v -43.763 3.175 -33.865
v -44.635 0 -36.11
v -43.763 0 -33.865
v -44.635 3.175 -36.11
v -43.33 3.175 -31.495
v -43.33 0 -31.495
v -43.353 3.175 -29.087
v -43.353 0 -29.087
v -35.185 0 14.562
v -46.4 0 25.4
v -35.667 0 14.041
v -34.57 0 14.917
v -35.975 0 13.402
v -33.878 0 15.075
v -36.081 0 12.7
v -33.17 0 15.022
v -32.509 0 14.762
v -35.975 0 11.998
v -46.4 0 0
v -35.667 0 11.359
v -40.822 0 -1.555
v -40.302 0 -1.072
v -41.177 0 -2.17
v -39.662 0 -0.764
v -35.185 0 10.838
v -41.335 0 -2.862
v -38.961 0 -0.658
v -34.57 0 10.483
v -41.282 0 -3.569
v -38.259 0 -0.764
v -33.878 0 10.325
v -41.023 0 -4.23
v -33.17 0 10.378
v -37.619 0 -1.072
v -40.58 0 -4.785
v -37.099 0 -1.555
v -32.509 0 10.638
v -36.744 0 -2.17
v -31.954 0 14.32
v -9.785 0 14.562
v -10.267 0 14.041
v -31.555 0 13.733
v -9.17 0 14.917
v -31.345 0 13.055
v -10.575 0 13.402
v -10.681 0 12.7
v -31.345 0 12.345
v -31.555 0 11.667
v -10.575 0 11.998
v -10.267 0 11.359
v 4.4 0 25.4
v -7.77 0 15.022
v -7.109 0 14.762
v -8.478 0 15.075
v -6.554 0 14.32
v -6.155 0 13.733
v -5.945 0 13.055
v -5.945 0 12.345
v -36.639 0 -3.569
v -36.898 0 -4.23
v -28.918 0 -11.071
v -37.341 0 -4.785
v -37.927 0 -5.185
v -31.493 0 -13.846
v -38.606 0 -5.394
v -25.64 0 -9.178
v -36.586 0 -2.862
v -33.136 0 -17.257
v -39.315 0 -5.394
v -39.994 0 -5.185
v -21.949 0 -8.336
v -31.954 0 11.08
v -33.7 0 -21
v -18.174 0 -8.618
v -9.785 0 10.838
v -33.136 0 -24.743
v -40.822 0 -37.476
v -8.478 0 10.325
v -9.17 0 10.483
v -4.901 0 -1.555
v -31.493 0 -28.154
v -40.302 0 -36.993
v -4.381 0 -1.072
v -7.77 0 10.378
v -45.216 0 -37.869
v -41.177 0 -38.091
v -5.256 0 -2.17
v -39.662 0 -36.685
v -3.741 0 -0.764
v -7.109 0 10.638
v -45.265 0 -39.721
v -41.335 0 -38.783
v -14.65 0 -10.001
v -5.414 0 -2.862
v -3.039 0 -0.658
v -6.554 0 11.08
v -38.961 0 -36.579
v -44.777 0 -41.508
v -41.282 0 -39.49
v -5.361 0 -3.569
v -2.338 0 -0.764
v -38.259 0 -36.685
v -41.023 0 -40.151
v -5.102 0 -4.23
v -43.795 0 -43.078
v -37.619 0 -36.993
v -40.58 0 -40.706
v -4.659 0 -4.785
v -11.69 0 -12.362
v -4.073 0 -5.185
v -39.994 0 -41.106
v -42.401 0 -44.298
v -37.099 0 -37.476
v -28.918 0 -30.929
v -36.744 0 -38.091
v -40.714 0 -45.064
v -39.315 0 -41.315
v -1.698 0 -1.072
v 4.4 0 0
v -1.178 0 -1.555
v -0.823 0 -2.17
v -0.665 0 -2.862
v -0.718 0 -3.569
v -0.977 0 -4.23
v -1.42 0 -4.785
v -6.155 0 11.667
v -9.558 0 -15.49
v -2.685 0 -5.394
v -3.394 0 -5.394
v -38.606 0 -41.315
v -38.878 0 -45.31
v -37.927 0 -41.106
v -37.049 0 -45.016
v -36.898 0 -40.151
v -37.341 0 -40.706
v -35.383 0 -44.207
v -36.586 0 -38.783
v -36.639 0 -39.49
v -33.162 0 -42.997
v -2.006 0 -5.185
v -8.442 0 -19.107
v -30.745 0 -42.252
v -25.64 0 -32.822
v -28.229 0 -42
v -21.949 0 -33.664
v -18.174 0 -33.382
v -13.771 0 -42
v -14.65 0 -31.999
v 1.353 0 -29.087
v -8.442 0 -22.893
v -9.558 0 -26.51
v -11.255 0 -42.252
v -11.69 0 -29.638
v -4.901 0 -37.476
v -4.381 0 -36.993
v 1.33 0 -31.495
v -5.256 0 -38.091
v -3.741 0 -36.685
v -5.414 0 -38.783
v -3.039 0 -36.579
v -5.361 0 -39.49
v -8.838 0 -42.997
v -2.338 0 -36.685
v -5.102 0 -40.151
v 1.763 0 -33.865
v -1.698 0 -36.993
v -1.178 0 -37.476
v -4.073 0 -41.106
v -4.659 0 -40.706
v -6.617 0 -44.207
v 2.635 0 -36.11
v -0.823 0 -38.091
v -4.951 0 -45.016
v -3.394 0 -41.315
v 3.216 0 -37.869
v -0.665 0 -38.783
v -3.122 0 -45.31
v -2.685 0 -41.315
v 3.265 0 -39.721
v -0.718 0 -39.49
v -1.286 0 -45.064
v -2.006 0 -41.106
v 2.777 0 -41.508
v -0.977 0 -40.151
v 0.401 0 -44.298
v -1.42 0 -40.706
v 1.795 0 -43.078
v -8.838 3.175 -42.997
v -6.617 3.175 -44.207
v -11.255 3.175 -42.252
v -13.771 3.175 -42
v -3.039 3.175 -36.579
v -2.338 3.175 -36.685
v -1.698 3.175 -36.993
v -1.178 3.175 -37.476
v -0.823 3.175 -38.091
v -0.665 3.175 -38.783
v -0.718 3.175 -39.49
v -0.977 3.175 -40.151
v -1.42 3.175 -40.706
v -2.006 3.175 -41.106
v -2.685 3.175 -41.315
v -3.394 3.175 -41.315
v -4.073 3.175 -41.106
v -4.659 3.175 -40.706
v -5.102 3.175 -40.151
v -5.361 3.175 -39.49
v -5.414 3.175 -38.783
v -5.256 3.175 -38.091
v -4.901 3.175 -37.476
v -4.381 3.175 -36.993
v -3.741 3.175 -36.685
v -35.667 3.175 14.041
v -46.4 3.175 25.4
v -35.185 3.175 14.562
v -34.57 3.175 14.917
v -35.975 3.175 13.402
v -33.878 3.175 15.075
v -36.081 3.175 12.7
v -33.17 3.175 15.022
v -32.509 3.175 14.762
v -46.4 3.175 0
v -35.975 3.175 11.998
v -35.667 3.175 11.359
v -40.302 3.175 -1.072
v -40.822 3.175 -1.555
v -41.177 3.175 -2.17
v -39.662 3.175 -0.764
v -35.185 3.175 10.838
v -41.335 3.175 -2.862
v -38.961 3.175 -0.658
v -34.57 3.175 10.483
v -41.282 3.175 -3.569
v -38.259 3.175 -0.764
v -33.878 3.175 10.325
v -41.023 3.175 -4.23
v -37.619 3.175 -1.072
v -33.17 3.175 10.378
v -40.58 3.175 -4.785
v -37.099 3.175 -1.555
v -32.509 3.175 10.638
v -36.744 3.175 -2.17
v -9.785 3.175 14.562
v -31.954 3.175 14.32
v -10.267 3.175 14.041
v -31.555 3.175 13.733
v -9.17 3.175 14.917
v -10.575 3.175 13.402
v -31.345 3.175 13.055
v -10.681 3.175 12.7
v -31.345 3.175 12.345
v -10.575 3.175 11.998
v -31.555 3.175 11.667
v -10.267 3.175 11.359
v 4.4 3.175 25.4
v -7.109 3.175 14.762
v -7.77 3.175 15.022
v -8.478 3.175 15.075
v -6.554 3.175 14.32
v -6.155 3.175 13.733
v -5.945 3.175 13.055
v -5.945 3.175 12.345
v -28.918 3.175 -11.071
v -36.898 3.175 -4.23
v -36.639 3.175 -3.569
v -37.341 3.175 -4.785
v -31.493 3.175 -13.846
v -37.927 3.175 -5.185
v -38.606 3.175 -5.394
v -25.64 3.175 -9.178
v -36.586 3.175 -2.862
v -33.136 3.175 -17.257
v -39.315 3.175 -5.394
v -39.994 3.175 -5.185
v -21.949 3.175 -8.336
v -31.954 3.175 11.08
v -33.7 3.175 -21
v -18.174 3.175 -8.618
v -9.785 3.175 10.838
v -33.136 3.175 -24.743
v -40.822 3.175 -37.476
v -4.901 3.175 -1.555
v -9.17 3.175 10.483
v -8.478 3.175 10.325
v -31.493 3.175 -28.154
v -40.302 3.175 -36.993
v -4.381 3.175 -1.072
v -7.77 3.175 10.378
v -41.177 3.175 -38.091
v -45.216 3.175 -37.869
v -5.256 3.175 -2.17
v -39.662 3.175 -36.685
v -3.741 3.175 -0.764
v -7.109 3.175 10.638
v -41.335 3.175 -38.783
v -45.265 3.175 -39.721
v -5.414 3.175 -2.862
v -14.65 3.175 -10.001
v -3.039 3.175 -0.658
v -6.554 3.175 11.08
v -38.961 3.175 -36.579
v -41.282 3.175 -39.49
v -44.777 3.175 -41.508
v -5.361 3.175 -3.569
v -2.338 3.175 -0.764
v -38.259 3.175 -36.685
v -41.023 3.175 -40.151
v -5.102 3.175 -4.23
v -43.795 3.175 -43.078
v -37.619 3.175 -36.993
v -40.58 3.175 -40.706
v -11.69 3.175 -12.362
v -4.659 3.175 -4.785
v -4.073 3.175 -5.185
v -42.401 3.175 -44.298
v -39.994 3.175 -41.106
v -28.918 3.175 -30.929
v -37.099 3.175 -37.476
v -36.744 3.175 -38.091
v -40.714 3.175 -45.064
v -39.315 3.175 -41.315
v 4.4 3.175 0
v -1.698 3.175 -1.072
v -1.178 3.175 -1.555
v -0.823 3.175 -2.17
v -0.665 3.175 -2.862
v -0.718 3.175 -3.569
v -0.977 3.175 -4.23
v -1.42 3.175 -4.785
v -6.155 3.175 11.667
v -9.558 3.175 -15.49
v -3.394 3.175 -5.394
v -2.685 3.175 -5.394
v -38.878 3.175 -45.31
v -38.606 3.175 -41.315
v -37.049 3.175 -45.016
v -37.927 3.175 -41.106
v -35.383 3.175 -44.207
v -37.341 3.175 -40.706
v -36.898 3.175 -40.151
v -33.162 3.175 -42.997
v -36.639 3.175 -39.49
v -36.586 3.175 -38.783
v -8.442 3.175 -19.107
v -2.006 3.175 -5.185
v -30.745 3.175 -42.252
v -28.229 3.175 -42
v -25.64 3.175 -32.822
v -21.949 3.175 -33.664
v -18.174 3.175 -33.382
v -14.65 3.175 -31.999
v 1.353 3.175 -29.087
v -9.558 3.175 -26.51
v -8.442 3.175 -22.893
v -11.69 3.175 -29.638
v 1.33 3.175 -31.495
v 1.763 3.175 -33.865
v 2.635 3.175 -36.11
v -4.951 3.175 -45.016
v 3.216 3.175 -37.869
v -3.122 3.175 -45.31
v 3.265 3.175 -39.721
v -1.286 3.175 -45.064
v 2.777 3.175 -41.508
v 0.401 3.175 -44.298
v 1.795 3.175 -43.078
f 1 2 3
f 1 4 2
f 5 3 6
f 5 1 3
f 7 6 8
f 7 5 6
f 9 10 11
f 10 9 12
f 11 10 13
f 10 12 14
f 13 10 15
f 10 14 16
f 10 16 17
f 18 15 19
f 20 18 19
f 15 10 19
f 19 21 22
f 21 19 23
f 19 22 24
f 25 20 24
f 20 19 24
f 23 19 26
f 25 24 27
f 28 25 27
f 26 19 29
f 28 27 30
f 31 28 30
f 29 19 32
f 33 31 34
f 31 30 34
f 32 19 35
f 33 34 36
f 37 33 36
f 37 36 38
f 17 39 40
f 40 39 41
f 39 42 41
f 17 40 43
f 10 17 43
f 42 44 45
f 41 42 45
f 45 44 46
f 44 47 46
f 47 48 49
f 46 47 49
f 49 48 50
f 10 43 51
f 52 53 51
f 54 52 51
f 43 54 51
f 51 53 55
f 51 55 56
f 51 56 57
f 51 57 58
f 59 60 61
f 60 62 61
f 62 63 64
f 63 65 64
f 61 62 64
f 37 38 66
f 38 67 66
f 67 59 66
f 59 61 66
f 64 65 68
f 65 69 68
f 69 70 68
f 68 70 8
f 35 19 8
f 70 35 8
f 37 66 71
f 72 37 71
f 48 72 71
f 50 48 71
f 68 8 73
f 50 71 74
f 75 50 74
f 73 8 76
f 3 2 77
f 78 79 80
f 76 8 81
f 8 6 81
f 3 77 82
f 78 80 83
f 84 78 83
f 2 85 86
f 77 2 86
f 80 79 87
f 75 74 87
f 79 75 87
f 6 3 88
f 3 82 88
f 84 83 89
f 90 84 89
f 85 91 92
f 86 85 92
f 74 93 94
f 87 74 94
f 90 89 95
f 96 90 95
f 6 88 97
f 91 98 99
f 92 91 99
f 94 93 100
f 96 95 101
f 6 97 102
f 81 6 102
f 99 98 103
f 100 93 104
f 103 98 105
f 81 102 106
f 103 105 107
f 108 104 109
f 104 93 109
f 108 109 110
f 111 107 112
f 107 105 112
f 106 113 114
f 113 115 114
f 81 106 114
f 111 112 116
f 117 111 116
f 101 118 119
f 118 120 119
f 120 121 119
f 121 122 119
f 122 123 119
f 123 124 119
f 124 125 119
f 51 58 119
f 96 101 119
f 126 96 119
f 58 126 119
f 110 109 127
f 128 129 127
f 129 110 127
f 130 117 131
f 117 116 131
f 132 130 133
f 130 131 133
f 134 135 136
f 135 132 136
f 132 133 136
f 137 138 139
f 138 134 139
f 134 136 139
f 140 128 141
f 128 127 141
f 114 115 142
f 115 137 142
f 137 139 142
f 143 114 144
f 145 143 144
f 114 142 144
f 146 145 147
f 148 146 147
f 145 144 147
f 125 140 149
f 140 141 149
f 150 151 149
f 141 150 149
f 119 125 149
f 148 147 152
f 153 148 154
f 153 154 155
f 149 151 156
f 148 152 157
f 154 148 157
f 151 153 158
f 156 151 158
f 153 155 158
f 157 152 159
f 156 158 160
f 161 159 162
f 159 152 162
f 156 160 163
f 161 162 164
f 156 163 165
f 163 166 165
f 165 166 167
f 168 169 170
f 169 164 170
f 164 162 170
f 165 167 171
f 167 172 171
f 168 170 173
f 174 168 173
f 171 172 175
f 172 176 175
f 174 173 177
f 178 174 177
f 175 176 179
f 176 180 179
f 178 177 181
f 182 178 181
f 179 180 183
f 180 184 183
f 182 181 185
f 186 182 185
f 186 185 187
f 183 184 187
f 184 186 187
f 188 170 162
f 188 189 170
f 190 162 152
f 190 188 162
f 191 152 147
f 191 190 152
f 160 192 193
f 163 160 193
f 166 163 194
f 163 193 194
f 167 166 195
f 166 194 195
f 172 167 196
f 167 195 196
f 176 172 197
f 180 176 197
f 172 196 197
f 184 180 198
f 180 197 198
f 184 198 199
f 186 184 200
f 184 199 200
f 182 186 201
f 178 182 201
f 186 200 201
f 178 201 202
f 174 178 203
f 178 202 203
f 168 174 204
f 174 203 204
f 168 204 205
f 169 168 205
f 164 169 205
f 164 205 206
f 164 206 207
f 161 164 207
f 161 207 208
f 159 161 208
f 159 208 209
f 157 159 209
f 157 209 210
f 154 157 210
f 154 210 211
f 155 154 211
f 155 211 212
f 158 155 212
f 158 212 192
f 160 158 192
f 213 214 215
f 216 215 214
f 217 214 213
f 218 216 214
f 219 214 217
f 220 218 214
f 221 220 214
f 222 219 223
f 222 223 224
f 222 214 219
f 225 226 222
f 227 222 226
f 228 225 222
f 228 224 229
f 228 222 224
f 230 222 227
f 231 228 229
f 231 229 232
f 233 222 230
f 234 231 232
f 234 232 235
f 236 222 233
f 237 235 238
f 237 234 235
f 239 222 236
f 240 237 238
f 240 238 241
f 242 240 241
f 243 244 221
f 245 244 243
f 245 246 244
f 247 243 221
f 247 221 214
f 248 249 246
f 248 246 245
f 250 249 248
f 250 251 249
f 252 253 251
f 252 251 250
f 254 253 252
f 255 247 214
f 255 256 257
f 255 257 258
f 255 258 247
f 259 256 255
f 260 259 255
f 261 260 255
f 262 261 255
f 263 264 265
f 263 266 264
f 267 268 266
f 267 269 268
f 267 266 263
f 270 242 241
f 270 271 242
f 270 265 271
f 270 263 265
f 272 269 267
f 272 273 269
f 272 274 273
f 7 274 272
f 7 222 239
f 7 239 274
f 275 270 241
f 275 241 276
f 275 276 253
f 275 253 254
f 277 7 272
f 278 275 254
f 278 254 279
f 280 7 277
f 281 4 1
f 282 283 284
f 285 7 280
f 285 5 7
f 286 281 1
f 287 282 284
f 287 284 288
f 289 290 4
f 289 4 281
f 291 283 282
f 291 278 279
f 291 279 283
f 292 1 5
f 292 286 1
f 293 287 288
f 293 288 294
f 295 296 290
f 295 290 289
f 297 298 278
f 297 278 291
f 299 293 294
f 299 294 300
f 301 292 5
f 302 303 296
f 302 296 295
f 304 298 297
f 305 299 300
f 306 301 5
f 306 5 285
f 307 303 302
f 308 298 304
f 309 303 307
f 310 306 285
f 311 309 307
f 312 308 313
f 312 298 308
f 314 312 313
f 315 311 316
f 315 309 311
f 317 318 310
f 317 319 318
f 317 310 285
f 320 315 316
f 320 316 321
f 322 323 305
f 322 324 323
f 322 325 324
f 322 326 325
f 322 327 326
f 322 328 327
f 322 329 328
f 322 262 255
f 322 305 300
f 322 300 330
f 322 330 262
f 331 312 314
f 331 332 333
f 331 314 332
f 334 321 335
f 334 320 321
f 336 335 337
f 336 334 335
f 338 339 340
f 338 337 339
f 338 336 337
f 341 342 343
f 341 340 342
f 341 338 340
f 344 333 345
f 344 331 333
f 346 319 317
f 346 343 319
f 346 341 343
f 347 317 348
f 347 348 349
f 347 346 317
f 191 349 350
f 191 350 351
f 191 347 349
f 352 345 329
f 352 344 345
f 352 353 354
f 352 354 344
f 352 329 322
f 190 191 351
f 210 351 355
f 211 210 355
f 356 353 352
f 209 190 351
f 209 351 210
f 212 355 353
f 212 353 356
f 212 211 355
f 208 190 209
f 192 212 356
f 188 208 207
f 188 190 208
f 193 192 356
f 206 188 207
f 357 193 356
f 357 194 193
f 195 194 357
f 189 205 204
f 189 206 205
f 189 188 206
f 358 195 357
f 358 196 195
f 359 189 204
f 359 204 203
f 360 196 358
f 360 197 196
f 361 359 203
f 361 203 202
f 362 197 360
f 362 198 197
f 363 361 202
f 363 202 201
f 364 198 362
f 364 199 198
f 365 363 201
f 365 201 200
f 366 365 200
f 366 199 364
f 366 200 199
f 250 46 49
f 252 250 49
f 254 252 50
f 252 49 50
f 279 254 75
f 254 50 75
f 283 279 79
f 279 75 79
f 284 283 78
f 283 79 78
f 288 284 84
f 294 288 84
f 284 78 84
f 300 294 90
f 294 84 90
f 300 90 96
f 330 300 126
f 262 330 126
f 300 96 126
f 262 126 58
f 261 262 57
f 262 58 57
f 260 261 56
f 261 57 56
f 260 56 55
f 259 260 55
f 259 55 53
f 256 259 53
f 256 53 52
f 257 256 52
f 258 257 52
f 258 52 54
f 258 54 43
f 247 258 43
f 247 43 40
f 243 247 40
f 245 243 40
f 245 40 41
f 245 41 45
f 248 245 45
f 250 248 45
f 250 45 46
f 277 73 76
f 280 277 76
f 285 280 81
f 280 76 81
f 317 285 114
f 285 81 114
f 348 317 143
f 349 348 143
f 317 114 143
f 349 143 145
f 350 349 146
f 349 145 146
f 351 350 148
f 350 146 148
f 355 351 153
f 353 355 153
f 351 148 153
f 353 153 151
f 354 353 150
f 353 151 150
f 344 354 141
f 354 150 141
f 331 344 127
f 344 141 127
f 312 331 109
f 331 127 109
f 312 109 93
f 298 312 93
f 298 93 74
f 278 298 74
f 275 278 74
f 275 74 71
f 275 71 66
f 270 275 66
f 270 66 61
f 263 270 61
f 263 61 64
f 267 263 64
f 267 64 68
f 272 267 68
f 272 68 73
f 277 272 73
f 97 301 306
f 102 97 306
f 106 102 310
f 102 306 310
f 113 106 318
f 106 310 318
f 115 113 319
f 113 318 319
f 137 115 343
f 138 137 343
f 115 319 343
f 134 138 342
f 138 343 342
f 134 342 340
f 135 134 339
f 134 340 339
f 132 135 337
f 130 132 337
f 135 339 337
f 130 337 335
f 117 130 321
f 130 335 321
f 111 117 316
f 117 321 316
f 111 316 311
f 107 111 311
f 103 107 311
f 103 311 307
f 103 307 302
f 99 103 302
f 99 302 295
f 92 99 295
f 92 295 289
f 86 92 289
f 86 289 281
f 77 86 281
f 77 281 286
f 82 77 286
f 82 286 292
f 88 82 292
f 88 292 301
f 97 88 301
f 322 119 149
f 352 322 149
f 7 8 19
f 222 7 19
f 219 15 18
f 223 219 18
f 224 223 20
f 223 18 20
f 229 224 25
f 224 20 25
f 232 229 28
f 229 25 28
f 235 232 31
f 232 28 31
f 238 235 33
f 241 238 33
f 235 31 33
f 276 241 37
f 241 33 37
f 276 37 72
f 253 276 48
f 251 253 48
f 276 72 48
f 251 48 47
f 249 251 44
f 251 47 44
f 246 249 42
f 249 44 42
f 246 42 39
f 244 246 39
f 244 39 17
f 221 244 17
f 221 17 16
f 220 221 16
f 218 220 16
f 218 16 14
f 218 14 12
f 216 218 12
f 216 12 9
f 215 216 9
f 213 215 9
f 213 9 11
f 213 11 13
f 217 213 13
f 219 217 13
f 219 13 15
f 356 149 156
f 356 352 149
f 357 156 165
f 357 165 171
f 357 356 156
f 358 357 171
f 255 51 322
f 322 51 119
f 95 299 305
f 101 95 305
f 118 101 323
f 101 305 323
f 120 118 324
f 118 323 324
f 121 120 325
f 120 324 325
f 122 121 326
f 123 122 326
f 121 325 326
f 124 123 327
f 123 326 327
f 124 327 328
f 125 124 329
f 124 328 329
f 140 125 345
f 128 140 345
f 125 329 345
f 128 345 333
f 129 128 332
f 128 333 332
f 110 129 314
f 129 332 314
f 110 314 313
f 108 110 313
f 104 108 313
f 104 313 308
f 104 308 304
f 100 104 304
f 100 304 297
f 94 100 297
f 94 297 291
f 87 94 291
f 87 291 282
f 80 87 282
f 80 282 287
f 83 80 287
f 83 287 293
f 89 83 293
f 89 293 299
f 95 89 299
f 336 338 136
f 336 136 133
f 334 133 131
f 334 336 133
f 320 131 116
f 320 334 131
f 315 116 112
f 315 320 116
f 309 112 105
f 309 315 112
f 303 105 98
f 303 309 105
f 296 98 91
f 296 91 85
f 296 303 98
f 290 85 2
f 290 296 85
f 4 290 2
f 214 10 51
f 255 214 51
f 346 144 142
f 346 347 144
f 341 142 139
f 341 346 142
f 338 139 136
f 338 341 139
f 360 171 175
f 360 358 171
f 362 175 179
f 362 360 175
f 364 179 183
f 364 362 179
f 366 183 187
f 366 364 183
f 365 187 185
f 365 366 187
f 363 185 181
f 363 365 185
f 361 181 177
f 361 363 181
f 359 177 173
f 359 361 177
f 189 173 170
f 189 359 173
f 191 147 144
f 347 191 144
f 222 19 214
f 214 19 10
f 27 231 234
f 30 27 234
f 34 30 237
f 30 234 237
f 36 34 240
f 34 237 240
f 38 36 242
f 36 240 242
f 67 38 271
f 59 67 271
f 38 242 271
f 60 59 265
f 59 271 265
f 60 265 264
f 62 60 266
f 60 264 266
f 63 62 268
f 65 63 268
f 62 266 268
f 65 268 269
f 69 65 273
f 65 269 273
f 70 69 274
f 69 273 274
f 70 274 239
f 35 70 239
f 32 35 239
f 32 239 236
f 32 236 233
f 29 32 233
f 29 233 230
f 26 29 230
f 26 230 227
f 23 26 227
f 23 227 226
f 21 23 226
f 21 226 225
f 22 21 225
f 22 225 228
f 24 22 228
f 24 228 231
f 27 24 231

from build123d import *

# Parameters (mm, degrees)
BOSS_EXTRUDE1_DEPTH            = 3.175
F_1_1_DIAMETER_HOLE1_D         = 25.4
SKETCH6_R                      = 2.38125
CUT_EXTRUDE1_DEPTH             = 63.666104275
SKETCH7_R                      = 6.35
SKETCH7_R_2                    = 2.38125
BOSS_EXTRUDE2_DEPTH            = 3.175
F_3_16_0_1875_DIAMETER_HOLE1_D = 4.7625
FILLET1_R                      = 12.7


with BuildPart() as part:
    # Sketch1 → Boss-Extrude1 (new body)
    with BuildSketch(Plane(origin=(0, 0, 0), x_dir=(1, 0, 0), z_dir=(0, 1, 0))):
        Polygon((0, 42), (-42, 42), (-46.4, 0), (-46.4, -25.4), (4.4, -25.4), (4.4, 0), align=None)
    extrude(amount=BOSS_EXTRUDE1_DEPTH)

    # 1 (1) Diameter Hole1 (through all)
    with Locations(Plane(origin=(0, 3.175, 0), x_dir=(1, 0, 0), z_dir=(0, 1, 0))):
        with Locations((-21, 21)):
            Hole(F_1_1_DIAMETER_HOLE1_D / 2)

    # Sketch6 → Cut-Extrude1 (cut, through all)
    with BuildSketch(Plane(origin=(0, 3.175, 0), x_dir=(1, 0, 0), z_dir=(0, 1, 0))):
        with Locations(Location((-38.960512242, 38.960512242, 0), (0, 0, 270))):
            Circle(SKETCH6_R)
        with Locations(Location((-38.960512242, 3.039487758, 0), (0, 0, 270))):
            Circle(SKETCH6_R)
        with Locations(Location((-3.039487758, 3.039487758, 0), (0, 0, 270))):
            Circle(SKETCH6_R)
        with Locations(Location((-3.039487758, 38.960512242, 0), (0, 0, 270))):
            Circle(SKETCH6_R)
    extrude(amount=-CUT_EXTRUDE1_DEPTH, mode=Mode.SUBTRACT)

    # Sketch7 → Boss-Extrude2 (add)
    # profile 1 of 2: a face of its own
    with BuildSketch(Plane(origin=(0, 3.175, 0), x_dir=(1, 0, 0), z_dir=(0, 1, 0))):
        with Locations((-38.960512242, 38.960512242)):
            Circle(SKETCH7_R)
        with Locations(Location((-38.960512242, 38.960512242, 0), (0, 0, 270))):
            Circle(SKETCH7_R_2, mode=Mode.SUBTRACT)
    # profile 2 of 2: a face of its own
    with BuildSketch(Plane(origin=(0, 3.175, 0), x_dir=(1, 0, 0), z_dir=(0, 1, 0))):
        with Locations((-3.039487758, 38.960512242)):
            Circle(SKETCH7_R)
        with Locations(Location((-3.039487758, 38.960512242, 0), (0, 0, 270))):
            Circle(SKETCH7_R_2, mode=Mode.SUBTRACT)
    extrude(amount=-BOSS_EXTRUDE2_DEPTH)

    # 3/16 (0.1875) Diameter Hole1 (through all)
    with Locations(Plane(origin=(0, 3.175, 0), x_dir=(1, 0, 0), z_dir=(0, 1, 0))):
        with Locations((-33.7, -12.7), (-8.3, -12.7)):
            Hole(F_3_16_0_1875_DIAMETER_HOLE1_D / 2)

    # Fillet1
    fillet1_edges = [part.edges().sort_by_distance(p)[0] for p in [
        (-42.844694729, 1.5875, -33.937004861),
        (-33.385208289, 1.5875, -42),
        (0.844694729, 1.5875, -33.937004861),
        (-8.614791711, 1.5875, -42),
    ]]
    fillet(fillet1_edges, radius=FILLET1_R)


solid = part.part
